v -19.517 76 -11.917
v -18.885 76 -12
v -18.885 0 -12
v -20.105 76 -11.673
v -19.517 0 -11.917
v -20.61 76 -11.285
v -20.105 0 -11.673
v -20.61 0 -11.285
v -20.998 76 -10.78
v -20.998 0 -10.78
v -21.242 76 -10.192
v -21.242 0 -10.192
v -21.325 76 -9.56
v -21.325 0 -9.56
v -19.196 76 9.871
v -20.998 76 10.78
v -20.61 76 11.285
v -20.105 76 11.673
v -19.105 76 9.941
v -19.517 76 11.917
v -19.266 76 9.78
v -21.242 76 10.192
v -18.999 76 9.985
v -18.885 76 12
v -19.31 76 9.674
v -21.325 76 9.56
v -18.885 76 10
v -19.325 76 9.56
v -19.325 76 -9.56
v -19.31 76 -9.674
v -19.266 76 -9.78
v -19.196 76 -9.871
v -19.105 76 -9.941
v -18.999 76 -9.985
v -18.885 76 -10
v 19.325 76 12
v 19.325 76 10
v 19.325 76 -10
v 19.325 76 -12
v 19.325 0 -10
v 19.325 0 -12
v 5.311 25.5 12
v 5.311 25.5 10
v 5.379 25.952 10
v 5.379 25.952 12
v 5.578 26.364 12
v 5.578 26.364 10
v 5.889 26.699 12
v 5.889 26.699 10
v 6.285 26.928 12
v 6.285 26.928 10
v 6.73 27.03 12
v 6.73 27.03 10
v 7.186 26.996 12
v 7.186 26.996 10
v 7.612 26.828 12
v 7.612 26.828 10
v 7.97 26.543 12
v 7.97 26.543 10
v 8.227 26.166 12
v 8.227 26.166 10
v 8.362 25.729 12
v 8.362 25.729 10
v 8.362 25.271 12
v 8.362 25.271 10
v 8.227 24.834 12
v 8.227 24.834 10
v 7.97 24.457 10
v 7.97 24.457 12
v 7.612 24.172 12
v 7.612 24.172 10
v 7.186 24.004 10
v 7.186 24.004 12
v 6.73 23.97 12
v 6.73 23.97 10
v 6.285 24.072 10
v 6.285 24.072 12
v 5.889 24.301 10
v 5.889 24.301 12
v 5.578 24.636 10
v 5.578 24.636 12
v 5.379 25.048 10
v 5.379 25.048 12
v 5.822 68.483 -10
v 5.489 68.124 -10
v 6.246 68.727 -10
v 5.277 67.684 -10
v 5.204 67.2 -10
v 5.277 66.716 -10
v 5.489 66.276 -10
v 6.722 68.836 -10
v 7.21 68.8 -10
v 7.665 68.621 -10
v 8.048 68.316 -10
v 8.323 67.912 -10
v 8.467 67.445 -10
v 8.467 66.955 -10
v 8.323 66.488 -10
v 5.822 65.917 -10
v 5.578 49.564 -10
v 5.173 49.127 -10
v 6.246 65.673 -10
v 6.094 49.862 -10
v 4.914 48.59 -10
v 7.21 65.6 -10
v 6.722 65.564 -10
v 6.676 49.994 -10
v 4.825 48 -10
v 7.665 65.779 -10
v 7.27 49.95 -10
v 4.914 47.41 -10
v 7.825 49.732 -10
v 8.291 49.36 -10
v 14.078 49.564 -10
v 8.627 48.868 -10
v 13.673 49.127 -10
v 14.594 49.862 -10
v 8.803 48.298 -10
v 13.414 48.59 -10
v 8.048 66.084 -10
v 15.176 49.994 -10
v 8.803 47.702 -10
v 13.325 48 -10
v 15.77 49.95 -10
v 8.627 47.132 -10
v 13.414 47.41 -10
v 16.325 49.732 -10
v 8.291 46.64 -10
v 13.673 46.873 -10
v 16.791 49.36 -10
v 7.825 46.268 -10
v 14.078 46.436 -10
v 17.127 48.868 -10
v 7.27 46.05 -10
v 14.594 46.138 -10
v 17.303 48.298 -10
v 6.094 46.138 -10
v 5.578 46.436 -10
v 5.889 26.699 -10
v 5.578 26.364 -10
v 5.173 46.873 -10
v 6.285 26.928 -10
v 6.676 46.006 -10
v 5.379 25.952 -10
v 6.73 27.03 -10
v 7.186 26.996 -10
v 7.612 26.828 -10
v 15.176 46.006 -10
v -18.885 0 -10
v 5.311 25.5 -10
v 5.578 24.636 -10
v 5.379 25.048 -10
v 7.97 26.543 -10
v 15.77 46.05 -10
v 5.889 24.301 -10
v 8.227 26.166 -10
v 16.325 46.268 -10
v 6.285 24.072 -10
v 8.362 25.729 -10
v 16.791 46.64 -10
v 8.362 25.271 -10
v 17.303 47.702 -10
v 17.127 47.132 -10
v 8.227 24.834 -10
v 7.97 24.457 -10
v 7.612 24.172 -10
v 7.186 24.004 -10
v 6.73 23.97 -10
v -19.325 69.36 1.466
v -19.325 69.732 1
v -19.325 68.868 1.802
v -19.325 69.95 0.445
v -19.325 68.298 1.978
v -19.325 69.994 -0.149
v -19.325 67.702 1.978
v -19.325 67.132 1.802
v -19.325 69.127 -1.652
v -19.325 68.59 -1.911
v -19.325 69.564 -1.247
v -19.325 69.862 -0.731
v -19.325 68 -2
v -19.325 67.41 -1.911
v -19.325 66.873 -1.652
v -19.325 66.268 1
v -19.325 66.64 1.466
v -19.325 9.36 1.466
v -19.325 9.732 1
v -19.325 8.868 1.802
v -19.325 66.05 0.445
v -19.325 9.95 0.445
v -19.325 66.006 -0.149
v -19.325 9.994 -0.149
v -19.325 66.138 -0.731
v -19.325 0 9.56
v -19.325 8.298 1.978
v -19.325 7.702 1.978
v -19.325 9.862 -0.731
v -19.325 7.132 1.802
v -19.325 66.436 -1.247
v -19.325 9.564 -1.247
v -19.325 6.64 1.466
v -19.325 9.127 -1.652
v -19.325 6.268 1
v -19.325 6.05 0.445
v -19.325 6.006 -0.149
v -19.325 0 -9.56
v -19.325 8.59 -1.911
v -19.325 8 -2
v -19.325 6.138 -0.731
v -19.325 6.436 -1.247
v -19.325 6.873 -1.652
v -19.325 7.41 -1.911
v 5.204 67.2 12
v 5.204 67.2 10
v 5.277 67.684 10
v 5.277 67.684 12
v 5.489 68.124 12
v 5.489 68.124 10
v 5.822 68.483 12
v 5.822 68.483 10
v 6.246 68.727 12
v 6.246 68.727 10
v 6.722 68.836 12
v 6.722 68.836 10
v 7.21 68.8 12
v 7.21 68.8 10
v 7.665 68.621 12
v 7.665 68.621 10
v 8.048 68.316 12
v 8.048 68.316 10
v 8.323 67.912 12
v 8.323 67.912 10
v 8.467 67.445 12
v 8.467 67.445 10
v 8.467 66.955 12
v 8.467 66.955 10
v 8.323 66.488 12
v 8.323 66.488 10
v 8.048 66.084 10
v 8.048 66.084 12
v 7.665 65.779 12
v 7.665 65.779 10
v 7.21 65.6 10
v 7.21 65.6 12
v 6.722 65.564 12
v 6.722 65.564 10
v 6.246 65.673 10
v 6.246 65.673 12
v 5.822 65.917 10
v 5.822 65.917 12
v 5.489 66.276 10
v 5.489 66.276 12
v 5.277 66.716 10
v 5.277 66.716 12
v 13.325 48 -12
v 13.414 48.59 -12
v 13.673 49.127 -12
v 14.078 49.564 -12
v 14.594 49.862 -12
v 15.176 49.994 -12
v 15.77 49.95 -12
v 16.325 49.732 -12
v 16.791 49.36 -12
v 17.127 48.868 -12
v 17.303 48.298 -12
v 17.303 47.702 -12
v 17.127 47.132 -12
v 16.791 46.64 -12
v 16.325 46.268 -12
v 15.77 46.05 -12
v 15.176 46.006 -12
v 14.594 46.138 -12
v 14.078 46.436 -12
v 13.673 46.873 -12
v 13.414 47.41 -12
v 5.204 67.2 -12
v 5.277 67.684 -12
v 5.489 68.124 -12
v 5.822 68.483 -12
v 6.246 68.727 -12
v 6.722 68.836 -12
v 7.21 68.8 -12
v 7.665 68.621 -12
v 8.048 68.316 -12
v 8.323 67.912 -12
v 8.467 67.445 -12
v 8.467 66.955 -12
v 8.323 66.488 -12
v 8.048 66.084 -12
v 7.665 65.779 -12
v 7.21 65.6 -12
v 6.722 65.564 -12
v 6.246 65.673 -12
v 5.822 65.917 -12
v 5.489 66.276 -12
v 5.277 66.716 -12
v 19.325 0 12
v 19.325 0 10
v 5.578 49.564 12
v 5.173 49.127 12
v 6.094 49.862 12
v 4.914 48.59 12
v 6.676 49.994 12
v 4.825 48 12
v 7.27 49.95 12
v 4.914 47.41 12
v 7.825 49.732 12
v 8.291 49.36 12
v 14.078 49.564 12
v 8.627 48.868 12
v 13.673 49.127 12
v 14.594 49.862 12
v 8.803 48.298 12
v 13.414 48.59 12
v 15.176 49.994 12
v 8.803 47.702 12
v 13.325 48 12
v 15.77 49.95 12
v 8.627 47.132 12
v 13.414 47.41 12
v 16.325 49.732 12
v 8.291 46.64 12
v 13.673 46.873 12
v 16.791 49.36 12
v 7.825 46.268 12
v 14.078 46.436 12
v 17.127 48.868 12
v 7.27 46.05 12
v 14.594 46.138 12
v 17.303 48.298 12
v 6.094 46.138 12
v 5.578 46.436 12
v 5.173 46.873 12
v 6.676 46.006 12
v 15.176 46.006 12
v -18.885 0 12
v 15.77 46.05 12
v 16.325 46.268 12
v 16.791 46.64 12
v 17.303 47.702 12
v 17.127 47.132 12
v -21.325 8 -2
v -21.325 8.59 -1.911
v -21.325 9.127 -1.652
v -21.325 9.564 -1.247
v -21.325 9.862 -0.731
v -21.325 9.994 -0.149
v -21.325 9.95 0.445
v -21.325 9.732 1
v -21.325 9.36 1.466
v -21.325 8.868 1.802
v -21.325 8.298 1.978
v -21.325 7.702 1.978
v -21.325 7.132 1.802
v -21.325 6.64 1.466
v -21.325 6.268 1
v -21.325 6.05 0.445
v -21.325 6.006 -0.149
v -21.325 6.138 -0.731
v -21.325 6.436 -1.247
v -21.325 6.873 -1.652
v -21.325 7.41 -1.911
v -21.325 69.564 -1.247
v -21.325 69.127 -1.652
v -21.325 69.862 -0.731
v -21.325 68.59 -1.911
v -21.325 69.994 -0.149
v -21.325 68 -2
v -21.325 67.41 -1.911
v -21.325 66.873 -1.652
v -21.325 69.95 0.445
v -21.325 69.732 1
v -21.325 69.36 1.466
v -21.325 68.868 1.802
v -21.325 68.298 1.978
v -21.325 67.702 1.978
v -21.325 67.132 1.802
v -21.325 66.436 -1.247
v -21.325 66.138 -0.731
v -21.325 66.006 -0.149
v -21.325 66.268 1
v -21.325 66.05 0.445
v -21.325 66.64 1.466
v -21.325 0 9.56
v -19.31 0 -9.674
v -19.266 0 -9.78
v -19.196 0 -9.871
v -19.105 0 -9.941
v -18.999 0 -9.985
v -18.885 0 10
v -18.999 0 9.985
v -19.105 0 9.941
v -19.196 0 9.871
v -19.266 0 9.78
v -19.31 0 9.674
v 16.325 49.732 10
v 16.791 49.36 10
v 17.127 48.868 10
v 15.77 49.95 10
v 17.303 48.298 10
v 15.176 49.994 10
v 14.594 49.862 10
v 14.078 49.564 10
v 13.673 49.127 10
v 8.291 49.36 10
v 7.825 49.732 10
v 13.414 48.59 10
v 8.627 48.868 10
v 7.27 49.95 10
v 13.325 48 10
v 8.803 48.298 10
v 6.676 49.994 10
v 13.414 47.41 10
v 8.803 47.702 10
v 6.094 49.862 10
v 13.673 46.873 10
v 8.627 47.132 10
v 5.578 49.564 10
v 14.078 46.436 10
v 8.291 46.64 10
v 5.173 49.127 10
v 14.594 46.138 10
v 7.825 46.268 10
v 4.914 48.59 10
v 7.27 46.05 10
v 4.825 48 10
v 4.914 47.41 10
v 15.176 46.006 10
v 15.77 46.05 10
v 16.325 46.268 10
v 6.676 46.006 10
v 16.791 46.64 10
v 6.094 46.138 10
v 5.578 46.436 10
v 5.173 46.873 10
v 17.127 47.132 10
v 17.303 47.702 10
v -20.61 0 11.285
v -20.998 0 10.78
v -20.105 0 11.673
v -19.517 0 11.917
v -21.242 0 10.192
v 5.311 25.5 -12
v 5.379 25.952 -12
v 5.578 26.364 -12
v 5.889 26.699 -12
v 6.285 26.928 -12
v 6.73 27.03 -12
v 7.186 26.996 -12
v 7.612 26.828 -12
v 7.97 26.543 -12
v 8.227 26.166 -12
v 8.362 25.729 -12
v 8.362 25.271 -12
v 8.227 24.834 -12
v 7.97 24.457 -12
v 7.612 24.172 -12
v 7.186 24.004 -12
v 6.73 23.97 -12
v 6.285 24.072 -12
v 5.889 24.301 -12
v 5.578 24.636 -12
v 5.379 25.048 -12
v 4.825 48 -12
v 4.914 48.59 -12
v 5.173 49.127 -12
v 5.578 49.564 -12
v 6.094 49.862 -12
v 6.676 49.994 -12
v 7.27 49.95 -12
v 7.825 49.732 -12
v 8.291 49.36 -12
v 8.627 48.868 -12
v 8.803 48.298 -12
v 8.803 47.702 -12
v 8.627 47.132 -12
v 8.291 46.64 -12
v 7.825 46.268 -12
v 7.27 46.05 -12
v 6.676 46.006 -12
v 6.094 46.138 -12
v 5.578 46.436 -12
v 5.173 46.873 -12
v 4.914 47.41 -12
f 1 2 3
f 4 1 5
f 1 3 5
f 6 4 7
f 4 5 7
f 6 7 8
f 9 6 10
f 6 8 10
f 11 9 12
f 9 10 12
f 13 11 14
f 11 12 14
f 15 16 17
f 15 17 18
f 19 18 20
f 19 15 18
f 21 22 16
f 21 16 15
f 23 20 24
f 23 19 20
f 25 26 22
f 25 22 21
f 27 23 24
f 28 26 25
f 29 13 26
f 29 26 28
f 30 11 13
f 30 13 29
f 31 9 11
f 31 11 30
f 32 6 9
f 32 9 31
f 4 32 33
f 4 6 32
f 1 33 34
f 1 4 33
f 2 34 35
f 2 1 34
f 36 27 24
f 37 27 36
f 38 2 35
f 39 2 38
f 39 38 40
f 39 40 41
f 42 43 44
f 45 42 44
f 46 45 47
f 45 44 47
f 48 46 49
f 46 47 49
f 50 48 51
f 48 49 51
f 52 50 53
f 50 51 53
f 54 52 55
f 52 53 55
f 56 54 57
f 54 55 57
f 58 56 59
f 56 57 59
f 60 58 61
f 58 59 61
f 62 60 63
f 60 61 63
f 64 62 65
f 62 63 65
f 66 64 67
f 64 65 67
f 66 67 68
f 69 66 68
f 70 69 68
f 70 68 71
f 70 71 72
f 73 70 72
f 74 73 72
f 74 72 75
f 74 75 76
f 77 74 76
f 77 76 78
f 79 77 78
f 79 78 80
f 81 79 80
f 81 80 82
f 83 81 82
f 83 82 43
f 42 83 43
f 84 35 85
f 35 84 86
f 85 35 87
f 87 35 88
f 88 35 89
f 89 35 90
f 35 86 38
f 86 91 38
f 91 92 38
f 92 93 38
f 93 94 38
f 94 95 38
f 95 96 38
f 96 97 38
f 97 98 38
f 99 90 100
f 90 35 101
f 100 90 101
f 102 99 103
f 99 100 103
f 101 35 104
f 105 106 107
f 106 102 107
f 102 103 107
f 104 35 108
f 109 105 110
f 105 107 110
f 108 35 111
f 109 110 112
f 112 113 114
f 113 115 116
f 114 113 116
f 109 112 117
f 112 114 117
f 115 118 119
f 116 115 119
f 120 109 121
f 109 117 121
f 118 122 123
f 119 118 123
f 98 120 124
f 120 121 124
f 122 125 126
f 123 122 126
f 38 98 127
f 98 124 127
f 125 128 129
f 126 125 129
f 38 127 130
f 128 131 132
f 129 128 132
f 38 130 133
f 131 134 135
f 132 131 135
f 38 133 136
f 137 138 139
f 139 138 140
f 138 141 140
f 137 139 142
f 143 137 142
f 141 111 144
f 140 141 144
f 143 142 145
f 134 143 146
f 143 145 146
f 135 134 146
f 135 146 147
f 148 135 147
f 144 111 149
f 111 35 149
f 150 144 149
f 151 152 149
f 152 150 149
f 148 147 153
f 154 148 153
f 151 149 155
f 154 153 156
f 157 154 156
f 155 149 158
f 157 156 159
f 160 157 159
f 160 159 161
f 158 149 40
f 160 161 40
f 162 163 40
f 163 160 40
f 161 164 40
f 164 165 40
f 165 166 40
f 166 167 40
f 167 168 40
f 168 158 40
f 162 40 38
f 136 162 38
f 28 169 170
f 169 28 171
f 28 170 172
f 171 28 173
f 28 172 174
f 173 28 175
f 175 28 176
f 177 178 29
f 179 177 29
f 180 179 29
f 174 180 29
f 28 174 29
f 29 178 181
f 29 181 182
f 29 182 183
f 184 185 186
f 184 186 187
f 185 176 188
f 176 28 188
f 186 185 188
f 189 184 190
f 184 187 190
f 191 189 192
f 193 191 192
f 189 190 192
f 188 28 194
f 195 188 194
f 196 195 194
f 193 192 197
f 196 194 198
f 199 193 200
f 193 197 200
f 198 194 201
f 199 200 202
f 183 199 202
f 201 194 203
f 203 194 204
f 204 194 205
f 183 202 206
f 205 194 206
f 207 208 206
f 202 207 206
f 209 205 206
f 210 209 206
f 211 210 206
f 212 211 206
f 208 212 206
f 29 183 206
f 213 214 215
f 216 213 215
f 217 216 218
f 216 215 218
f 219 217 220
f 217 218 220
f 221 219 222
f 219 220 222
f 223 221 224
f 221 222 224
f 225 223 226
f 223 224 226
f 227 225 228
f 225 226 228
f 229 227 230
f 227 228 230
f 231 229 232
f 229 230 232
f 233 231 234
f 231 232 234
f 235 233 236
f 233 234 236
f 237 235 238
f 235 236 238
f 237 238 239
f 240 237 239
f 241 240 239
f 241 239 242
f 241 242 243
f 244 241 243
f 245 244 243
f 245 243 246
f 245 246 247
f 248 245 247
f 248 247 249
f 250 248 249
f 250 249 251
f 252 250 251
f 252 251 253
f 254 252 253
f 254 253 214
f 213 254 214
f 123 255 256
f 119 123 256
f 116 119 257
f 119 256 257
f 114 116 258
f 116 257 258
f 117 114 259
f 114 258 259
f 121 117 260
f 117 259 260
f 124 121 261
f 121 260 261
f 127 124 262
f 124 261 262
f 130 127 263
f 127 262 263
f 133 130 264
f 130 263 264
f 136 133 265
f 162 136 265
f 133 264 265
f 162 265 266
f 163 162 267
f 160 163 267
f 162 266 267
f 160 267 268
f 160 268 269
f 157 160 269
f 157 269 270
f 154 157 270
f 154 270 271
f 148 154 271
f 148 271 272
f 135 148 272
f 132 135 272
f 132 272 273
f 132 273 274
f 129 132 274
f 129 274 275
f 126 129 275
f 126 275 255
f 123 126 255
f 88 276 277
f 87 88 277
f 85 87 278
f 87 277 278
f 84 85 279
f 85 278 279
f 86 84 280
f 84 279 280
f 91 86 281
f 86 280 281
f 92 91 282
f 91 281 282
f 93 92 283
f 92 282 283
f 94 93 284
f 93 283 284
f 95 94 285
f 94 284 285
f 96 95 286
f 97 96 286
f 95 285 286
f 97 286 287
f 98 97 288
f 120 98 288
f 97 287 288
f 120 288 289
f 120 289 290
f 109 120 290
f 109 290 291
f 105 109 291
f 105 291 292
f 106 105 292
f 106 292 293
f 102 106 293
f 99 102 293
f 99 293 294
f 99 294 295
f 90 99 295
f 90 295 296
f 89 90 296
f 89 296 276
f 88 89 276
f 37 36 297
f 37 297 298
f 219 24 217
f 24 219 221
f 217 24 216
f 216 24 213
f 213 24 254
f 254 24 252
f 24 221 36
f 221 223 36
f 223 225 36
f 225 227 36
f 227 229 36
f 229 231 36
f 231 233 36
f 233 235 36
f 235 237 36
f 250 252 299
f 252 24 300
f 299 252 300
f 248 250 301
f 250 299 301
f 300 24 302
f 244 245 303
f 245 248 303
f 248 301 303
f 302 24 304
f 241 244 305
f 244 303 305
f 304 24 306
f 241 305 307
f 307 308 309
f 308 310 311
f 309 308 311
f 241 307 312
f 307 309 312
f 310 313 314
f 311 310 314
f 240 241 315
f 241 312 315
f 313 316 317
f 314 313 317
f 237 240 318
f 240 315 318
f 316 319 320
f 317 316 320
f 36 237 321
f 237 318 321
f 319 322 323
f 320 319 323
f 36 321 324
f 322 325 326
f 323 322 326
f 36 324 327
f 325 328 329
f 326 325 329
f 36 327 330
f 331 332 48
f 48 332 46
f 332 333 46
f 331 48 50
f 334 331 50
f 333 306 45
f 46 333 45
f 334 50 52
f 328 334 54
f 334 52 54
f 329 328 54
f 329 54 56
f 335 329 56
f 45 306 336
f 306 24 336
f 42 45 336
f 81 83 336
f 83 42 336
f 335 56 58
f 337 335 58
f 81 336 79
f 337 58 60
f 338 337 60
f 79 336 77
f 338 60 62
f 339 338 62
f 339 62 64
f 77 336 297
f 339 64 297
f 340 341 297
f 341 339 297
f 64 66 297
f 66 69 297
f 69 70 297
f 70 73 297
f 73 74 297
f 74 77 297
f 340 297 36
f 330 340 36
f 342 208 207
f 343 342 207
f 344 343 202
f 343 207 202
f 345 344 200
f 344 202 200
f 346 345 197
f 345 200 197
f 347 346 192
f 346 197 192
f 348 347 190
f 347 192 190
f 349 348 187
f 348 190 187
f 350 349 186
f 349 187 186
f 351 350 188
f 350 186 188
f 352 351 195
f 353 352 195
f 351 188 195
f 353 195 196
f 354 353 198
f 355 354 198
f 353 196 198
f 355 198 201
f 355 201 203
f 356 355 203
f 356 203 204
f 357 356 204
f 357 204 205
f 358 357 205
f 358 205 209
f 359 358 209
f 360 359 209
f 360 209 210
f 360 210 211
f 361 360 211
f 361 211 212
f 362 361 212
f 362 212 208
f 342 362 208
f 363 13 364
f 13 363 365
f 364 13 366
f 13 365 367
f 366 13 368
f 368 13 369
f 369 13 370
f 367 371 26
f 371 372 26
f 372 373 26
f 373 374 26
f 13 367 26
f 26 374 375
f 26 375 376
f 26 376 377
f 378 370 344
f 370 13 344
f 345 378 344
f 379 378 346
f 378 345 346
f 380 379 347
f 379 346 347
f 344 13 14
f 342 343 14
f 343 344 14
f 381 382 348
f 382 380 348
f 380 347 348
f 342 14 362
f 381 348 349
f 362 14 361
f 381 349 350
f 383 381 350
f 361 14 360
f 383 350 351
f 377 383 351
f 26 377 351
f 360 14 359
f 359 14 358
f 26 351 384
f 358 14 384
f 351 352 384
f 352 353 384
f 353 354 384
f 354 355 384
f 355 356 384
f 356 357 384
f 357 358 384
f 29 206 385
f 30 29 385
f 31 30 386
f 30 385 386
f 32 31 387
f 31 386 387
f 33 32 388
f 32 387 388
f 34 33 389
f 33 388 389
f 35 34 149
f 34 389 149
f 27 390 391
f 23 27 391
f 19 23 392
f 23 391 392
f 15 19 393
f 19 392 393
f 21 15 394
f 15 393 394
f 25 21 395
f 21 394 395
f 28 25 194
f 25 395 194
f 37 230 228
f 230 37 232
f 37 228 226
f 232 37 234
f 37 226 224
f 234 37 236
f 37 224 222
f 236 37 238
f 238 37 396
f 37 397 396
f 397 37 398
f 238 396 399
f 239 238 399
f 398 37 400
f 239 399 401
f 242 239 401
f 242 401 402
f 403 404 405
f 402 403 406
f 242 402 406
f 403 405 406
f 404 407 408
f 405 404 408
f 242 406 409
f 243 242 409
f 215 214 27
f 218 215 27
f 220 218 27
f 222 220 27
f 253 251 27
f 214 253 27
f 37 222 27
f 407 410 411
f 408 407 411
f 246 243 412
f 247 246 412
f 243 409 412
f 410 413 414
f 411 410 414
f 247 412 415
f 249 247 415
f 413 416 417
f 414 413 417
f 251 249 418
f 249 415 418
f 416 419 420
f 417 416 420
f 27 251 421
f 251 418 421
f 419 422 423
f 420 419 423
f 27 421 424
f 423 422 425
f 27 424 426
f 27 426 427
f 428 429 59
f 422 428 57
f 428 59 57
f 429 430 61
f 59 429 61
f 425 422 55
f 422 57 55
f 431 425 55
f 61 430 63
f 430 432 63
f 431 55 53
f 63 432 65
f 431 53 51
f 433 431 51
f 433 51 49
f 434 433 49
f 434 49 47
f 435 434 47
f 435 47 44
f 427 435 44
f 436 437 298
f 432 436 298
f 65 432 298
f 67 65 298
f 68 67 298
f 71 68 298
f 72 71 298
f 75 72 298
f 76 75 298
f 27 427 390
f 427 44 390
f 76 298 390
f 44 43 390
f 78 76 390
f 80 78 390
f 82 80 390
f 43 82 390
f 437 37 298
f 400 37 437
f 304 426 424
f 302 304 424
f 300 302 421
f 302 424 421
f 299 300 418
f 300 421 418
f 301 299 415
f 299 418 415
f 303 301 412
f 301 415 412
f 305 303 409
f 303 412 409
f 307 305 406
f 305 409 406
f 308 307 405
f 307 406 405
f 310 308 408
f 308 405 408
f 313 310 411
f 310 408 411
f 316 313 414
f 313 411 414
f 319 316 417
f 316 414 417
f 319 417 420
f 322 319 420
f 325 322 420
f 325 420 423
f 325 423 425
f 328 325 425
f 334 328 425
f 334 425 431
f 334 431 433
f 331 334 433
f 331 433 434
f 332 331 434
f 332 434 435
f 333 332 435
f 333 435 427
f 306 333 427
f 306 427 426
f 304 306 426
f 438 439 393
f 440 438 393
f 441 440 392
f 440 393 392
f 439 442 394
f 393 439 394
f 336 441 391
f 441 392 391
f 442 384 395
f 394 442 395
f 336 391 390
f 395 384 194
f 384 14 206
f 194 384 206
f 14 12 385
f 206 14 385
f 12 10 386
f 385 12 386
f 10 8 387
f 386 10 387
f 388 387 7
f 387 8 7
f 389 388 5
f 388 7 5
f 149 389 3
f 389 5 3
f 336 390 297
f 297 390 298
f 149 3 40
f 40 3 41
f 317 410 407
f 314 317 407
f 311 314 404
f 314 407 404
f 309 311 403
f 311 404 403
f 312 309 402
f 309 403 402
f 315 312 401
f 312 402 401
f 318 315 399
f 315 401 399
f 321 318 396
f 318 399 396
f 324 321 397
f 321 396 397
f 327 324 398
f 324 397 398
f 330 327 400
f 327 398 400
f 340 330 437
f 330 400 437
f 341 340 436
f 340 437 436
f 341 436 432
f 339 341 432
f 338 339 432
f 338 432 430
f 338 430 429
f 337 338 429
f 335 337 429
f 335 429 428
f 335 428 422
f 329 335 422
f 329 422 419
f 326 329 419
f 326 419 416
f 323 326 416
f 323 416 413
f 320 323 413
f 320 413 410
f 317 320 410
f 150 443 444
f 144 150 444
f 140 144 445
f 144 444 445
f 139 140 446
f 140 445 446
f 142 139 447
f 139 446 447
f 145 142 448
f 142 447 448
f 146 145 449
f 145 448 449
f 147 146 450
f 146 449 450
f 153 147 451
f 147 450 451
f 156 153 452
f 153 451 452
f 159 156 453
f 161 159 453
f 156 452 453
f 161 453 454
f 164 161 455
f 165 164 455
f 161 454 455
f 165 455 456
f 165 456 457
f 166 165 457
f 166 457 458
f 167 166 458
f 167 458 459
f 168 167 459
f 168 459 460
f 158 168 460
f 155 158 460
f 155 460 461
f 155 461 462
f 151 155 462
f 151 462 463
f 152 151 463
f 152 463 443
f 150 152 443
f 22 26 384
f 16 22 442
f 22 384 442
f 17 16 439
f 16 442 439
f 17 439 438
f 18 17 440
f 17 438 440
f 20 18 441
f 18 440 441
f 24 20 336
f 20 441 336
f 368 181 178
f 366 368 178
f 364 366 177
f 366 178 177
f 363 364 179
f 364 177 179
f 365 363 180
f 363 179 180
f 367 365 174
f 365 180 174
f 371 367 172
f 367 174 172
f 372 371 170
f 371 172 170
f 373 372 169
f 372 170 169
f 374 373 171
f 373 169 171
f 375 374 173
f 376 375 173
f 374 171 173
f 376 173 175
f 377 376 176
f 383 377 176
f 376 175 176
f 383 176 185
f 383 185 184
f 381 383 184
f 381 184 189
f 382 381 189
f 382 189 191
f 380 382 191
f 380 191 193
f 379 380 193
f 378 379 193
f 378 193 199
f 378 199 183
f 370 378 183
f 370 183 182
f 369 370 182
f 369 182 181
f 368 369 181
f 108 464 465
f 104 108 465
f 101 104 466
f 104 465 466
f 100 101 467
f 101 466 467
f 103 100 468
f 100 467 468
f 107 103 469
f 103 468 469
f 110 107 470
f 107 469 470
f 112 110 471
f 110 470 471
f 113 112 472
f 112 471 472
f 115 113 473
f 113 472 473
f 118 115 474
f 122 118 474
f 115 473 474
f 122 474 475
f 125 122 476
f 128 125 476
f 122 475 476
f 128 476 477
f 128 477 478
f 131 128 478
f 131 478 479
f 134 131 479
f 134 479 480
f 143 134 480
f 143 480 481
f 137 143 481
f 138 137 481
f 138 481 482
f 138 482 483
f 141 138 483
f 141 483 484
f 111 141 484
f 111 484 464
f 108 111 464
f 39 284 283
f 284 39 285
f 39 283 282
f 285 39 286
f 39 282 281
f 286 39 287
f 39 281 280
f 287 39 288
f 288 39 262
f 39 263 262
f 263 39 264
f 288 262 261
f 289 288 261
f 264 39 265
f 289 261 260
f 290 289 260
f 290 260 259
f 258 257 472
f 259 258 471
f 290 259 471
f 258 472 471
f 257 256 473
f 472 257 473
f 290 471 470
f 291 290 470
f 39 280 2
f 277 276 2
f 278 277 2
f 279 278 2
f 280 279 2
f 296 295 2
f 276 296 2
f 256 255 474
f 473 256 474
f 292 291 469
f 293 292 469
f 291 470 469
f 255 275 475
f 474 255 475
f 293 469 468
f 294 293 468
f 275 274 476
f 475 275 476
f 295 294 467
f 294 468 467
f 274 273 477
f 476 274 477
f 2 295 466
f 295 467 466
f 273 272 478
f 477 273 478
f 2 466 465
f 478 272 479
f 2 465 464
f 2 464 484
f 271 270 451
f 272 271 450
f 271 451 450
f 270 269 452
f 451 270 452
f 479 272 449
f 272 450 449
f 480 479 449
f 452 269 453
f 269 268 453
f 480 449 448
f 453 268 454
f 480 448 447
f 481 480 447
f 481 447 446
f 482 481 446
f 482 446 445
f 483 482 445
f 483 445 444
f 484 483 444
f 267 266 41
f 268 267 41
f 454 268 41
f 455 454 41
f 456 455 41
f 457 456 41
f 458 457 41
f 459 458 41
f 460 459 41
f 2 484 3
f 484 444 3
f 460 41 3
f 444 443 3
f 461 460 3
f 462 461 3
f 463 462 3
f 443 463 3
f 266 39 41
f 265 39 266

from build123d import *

# Parameters (mm, degrees)
BASE_FLANGE1_DEPTH = 76
CUT_EXTRUDE1_REACH = 84.503
SKETCH2_R          = 1.640689261
SKETCH2_R_2        = 1.533997934
SKETCH2_R_3        = 2
CUT_EXTRUDE2_REACH = 88.104
SKETCH3_R          = 2


# Sheet-metal steps are written as plain solids
with BuildPart() as part:
    # Sketch1 → Base-Flange1 (new body)
    with BuildSketch(Plane(origin=(0, 0, 0), x_dir=(1, 0, 0), z_dir=(0, 1, 0))):
        with BuildLine():
            Line((19.325, -10), (-18.885, -10))
            ThreePointArc((-18.885, -10), (-19.196126984, -9.871126984), (-19.325, -9.56))
            Line((-19.325, -9.56), (-19.325, 9.56))
            ThreePointArc((-19.325, 9.56), (-19.196126984, 9.871126984), (-18.885, 10))
            Line((-18.885, 10), (19.325, 10))
            Line((19.325, 10), (19.325, 12))
            Line((19.325, 12), (-18.885, 12))
            ThreePointArc((-18.885, 12), (-20.610340546, 11.285340546), (-21.325, 9.56))
            Line((-21.325, 9.56), (-21.325, -9.56))
            ThreePointArc((-21.325, -9.56), (-20.610340546, -11.285340546), (-18.885, -12))
            Line((-18.885, -12), (19.325, -12))
            Line((19.325, -12), (19.325, -10))
        make_face()
    extrude(amount=BASE_FLANGE1_DEPTH)

    # Cut-Extrude1: up to this face of the body (flat: up to its plane)
    cut_extrude1_end = Plane(part.part.faces().sort_by_distance((0.22, 38, 12))[0])
    # Sketch2 → Cut-Extrude1 (cut, up to the picked face)
    with BuildSketch(Plane(origin=(0, 0, -12), x_dir=(-1, 0, 0), z_dir=(0, 0, -1)), mode=Mode.PRIVATE) as cut_extrude1_sk1:
        with Locations((-6.845, 67.2)):
            Circle(SKETCH2_R)
    cut_extrude1_tool1 = split(extrude(cut_extrude1_sk1.sketch, amount=-CUT_EXTRUDE1_REACH, mode=Mode.PRIVATE), bisect_by=cut_extrude1_end, keep=Keep.BOTH, mode=Mode.PRIVATE)
    # Sketch2 → Cut-Extrude1 (cut, up to the picked face)
    with BuildSketch(Plane(origin=(0, 0, -12), x_dir=(-1, 0, 0), z_dir=(0, 0, -1)), mode=Mode.PRIVATE) as cut_extrude1_sk2:
        with Locations((-6.845, 25.5)):
            Circle(SKETCH2_R_2)
    cut_extrude1_tool2 = split(extrude(cut_extrude1_sk2.sketch, amount=-CUT_EXTRUDE1_REACH, mode=Mode.PRIVATE), bisect_by=cut_extrude1_end, keep=Keep.BOTH, mode=Mode.PRIVATE)
    # Sketch2 → Cut-Extrude1 (cut, up to the picked face)
    with BuildSketch(Plane(origin=(0, 0, -12), x_dir=(-1, 0, 0), z_dir=(0, 0, -1)), mode=Mode.PRIVATE) as cut_extrude1_sk3:
        with Locations((-6.825, 48)):
            Circle(SKETCH2_R_3)
    cut_extrude1_tool3 = split(extrude(cut_extrude1_sk3.sketch, amount=-CUT_EXTRUDE1_REACH, mode=Mode.PRIVATE), bisect_by=cut_extrude1_end, keep=Keep.BOTH, mode=Mode.PRIVATE)
    # Sketch2 → Cut-Extrude1 (cut, up to the picked face)
    with BuildSketch(Plane(origin=(0, 0, -12), x_dir=(-1, 0, 0), z_dir=(0, 0, -1)), mode=Mode.PRIVATE) as cut_extrude1_sk4:
        with Locations((-15.325, 48)):
            Circle(SKETCH2_R_3)
    cut_extrude1_tool4 = split(extrude(cut_extrude1_sk4.sketch, amount=-CUT_EXTRUDE1_REACH, mode=Mode.PRIVATE), bisect_by=cut_extrude1_end, keep=Keep.BOTH, mode=Mode.PRIVATE)
    add(cut_extrude1_tool1.solids().sort_by(Axis((6.845, 67.2, -12), (0, 0, 1)))[0], mode=Mode.SUBTRACT)
    add(cut_extrude1_tool2.solids().sort_by(Axis((6.845, 25.5, -12), (0, 0, 1)))[0], mode=Mode.SUBTRACT)
    add(cut_extrude1_tool3.solids().sort_by(Axis((6.825, 48, -12), (0, 0, 1)))[0], mode=Mode.SUBTRACT)
    add(cut_extrude1_tool4.solids().sort_by(Axis((15.325, 48, -12), (0, 0, 1)))[0], mode=Mode.SUBTRACT)

    # Sketch3 → Cut-Extrude2 (cut, up to next)
    with BuildSketch(Plane(origin=(-19.325, 0, 0), x_dir=(0, 0, -1), z_dir=(1, 0, 0)), mode=Mode.PRIVATE) as cut_extrude2_sk1:
        with Locations((0, 68)):
            Circle(SKETCH3_R)
    cut_extrude2_tool1 = extrude(cut_extrude2_sk1.sketch, amount=-CUT_EXTRUDE2_REACH, mode=Mode.PRIVATE) & part.part
    # Sketch3 → Cut-Extrude2 (cut, up to next)
    with BuildSketch(Plane(origin=(-19.325, 0, 0), x_dir=(0, 0, -1), z_dir=(1, 0, 0)), mode=Mode.PRIVATE) as cut_extrude2_sk2:
        with Locations((0, 8)):
            Circle(SKETCH3_R)
    cut_extrude2_tool2 = extrude(cut_extrude2_sk2.sketch, amount=-CUT_EXTRUDE2_REACH, mode=Mode.PRIVATE) & part.part
    add(cut_extrude2_tool1.solids().sort_by_distance((-19.325, 68, 0))[0], mode=Mode.SUBTRACT)
    add(cut_extrude2_tool2.solids().sort_by_distance((-19.325, 8, 0))[0], mode=Mode.SUBTRACT)


solid = part.part
